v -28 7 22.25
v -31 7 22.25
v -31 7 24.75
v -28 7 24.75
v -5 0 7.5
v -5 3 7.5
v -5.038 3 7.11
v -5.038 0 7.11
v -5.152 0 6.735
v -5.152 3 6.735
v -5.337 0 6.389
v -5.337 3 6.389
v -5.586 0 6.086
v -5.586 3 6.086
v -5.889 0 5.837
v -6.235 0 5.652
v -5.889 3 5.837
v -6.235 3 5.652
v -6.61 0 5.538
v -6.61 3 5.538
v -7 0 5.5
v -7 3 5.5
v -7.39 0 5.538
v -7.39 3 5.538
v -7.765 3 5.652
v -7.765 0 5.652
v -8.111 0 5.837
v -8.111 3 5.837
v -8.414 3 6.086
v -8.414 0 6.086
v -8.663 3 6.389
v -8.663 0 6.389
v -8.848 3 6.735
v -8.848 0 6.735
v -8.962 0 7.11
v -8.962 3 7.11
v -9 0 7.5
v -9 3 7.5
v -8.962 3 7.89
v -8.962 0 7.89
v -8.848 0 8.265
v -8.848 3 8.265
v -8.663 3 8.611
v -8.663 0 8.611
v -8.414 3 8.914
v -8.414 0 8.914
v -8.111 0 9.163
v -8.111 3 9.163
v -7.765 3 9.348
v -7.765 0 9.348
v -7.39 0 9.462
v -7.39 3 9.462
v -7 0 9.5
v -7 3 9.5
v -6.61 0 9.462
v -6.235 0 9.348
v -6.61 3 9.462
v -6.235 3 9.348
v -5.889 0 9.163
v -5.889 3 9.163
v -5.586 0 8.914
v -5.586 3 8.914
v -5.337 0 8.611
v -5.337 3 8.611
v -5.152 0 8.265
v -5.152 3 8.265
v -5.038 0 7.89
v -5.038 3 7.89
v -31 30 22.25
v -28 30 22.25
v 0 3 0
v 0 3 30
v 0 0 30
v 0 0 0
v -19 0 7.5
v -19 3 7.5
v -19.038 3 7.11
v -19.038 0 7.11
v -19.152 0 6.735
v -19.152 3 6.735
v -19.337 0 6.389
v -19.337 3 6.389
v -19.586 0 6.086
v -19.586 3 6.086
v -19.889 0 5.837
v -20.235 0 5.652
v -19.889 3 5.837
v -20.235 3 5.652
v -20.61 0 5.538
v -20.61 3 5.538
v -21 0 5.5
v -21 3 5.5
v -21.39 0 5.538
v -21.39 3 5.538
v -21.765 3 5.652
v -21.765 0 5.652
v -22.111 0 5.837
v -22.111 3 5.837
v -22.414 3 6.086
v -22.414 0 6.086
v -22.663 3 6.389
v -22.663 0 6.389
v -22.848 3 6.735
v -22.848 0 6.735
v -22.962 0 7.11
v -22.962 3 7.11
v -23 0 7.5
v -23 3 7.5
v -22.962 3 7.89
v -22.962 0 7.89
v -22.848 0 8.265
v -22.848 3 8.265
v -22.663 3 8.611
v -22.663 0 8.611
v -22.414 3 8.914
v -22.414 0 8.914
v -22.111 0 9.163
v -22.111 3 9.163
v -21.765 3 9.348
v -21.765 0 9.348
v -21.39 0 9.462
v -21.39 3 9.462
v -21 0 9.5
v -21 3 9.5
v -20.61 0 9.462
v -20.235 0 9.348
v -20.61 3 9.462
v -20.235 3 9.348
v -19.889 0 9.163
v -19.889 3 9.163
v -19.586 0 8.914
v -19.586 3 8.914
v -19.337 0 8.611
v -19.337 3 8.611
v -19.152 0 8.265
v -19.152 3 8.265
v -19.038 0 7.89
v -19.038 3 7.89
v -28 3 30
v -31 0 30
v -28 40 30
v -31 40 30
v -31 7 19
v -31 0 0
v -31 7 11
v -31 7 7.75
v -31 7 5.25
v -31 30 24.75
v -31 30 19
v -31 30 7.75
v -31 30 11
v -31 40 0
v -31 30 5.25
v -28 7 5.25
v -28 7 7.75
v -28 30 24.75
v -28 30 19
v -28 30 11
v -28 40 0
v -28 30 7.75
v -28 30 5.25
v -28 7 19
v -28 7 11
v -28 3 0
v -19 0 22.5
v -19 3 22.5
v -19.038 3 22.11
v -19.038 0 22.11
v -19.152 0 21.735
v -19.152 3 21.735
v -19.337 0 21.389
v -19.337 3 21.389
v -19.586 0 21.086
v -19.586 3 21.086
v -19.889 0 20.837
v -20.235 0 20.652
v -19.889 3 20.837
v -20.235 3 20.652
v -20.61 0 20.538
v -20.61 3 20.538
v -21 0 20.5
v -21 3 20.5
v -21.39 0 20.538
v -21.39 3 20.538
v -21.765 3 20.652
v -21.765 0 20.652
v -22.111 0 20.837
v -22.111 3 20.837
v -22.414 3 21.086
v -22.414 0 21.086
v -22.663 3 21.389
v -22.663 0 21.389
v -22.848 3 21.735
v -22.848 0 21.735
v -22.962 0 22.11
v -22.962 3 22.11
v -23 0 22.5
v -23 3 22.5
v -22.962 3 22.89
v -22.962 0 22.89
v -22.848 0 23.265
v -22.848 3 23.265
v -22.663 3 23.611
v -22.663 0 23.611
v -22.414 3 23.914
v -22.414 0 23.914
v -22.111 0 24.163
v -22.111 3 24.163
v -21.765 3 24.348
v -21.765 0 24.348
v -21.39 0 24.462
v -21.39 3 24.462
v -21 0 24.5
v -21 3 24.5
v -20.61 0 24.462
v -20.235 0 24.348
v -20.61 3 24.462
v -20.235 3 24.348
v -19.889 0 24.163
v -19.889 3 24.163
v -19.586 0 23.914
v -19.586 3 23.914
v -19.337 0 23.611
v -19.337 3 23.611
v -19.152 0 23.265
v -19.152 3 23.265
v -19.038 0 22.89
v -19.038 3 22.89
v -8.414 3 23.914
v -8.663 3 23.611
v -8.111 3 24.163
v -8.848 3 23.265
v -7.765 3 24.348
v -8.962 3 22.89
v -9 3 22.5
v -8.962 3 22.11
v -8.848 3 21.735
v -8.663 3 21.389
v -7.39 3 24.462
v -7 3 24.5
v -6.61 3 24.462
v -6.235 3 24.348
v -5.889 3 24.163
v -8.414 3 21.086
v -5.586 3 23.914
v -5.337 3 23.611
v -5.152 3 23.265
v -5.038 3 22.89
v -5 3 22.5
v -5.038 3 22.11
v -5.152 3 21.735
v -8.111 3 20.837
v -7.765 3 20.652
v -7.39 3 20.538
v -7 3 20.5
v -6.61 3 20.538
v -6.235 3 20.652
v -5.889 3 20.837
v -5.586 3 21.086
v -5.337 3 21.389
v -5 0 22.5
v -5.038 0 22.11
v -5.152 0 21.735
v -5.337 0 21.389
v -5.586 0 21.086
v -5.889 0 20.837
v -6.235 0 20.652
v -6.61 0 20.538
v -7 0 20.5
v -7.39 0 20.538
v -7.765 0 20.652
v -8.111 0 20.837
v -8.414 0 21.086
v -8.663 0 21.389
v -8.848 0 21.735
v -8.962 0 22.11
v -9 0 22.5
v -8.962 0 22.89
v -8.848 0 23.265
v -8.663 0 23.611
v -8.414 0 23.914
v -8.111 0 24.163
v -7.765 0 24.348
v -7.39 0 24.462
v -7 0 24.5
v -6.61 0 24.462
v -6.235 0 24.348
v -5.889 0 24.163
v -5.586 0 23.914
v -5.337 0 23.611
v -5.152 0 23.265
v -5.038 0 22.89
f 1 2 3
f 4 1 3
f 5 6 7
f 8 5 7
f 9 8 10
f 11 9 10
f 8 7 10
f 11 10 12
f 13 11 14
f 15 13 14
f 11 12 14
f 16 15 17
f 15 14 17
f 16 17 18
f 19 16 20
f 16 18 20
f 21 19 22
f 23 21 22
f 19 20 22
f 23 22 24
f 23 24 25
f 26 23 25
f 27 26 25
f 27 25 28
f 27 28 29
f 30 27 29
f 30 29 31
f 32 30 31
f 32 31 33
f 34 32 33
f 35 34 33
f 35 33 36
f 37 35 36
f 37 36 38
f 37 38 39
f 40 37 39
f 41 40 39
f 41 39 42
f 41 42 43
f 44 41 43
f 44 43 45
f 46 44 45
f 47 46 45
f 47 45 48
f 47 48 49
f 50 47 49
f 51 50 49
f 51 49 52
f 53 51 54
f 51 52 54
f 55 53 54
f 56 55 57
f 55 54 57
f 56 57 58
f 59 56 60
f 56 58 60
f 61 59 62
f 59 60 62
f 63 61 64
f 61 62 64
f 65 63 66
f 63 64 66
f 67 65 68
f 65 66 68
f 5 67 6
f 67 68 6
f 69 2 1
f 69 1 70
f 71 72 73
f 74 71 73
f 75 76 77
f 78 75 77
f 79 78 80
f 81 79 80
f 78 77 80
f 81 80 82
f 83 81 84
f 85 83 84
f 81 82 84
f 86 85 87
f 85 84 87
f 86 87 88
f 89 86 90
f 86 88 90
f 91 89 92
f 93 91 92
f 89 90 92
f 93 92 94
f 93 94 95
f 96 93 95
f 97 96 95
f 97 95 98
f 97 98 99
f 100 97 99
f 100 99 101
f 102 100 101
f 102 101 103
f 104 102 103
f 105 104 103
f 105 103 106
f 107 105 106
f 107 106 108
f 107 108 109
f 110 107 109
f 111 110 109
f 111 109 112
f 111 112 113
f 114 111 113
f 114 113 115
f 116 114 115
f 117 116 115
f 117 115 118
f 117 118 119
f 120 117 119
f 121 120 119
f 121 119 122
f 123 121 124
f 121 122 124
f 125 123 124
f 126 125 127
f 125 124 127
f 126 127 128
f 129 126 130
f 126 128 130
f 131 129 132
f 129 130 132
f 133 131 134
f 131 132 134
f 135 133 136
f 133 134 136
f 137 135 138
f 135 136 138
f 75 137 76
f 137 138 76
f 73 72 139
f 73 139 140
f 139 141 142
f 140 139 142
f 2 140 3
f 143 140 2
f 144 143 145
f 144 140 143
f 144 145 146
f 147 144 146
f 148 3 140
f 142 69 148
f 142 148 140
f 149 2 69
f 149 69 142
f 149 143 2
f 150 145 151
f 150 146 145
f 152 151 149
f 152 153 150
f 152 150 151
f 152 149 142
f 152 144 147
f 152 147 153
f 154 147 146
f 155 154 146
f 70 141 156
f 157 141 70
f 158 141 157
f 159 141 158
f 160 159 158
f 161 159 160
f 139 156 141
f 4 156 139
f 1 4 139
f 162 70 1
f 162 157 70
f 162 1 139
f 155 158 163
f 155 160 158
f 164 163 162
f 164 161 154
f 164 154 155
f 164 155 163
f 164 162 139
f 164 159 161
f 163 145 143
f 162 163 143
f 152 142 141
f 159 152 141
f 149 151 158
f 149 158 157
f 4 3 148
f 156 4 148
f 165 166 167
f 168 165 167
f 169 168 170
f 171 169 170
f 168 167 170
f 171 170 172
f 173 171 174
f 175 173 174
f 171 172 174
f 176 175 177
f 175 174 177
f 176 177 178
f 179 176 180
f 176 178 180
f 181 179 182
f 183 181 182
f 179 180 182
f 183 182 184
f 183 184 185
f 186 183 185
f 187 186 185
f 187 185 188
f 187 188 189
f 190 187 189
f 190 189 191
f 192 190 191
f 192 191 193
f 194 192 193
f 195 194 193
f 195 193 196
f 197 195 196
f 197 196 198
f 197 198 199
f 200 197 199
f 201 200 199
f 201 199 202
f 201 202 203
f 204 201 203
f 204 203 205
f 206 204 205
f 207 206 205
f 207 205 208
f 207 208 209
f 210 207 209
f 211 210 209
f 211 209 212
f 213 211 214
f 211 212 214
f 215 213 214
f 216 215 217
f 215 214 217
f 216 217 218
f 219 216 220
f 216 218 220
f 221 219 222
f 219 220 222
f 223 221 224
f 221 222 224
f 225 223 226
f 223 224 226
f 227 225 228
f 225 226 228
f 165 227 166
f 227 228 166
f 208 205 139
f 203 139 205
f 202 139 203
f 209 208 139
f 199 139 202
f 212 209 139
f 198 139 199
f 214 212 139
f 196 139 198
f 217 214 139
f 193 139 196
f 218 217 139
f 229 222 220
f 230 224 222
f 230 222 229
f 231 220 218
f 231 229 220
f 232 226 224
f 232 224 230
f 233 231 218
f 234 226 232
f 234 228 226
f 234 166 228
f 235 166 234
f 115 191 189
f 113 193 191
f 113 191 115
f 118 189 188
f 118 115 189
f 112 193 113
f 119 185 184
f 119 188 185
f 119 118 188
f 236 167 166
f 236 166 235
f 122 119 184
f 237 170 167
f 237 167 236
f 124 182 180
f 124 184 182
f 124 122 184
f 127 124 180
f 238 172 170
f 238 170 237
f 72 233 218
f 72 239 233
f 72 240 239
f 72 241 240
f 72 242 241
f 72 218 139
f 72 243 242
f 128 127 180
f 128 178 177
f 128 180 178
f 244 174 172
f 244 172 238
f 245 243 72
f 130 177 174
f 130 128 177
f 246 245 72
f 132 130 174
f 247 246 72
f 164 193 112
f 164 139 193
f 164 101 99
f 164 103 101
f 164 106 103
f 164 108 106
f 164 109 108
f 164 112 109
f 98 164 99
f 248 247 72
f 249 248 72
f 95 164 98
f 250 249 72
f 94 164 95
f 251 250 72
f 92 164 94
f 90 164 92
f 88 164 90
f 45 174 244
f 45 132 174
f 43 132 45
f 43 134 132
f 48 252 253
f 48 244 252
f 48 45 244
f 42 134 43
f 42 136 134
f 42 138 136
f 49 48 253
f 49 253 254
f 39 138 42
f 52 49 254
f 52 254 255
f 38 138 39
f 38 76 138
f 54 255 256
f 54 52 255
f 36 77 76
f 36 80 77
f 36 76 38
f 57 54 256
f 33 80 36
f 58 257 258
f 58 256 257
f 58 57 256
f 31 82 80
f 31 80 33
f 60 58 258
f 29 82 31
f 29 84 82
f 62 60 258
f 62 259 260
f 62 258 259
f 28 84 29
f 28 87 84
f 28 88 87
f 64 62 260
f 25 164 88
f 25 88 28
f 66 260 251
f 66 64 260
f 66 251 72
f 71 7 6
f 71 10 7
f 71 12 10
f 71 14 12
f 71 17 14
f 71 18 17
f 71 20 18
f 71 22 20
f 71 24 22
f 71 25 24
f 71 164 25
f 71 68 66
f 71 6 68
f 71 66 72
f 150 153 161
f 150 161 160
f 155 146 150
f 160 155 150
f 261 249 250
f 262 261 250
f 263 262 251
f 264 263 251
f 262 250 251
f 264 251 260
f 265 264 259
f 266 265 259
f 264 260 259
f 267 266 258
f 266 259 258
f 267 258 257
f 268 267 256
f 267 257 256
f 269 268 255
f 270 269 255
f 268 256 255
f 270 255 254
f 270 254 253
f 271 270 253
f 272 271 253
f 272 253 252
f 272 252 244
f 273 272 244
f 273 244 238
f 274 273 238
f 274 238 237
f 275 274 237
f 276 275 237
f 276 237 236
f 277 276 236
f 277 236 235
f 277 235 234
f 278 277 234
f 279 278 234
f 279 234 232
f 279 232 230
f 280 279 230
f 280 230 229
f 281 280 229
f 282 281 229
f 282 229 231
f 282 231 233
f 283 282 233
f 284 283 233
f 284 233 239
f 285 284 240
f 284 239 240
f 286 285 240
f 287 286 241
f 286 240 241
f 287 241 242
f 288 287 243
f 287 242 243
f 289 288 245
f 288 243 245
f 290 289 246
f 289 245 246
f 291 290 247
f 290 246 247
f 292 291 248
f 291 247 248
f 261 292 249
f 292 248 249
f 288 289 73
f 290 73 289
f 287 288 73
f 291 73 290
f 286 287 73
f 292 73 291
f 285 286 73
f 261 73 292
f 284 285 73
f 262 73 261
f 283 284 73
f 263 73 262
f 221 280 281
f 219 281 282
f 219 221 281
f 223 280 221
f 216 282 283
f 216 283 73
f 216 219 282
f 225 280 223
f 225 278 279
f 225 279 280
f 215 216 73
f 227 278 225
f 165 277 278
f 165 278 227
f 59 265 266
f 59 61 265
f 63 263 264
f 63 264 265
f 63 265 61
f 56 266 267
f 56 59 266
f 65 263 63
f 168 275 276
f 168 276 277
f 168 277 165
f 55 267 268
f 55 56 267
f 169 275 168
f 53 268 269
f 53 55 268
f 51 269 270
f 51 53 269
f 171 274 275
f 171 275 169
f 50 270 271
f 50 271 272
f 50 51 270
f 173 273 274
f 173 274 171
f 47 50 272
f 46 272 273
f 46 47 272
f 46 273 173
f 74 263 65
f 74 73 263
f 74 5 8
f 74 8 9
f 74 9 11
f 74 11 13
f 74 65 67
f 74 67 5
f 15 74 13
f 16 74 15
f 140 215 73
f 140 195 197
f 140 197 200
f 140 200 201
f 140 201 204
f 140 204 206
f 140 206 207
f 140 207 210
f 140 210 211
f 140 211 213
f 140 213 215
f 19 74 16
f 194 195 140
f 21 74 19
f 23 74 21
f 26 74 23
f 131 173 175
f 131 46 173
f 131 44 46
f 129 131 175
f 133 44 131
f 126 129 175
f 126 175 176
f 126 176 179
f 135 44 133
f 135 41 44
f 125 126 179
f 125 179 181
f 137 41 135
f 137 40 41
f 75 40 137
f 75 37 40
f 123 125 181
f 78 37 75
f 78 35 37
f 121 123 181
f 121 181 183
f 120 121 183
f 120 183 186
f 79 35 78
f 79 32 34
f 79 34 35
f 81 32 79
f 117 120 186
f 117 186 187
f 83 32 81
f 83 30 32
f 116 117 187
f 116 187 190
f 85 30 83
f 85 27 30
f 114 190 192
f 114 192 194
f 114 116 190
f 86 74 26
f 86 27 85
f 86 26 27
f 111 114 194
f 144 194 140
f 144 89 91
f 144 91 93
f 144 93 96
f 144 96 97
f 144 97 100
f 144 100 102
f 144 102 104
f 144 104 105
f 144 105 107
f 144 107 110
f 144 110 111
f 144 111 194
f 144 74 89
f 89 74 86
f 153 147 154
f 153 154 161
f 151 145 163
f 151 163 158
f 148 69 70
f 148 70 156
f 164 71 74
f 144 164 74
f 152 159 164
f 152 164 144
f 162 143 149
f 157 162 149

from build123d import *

# Parameters (mm, degrees)
BOSS_EXTRUDE1_DEPTH = 30
SKETCH3_R           = 2
CUT_EXTRUDE1_DEPTH  = 4
SKETCH5_W           = 2.5
SKETCH5_H           = 23
SKETCH5_W_2         = 8
CUT_EXTRUDE2_DEPTH  = 32


with BuildPart() as part:
    # Sketch2 → Boss-Extrude1 (new body)
    with BuildSketch(Plane.XY):
        Polygon((0, 0), (-31, 0), (-31, 40), (-28, 40), (-28, 3), (0, 3), align=None)
    extrude(amount=BOSS_EXTRUDE1_DEPTH)

    # Sketch3 → Cut-Extrude1 (cut, through all)
    with BuildSketch(Plane(origin=(0, 3, 0), x_dir=(1, 0, 0), z_dir=(0, 1, 0))):
        with Locations((-7, -22.5)):
            Circle(SKETCH3_R)
        with Locations((-21, -22.5)):
            Circle(SKETCH3_R)
        with Locations((-7, -7.5)):
            Circle(SKETCH3_R)
        with Locations((-21, -7.5)):
            Circle(SKETCH3_R)
    extrude(amount=-CUT_EXTRUDE1_DEPTH, mode=Mode.SUBTRACT)

    # Sketch5 → Cut-Extrude2 (cut, through all)
    with BuildSketch(Plane.ZY.offset(31)):
        with Locations((23.5, 18.5)):
            Rectangle(SKETCH5_W, SKETCH5_H)
        with Locations((15, 18.5)):
            Rectangle(SKETCH5_W_2, SKETCH5_H)
        with Locations((6.5, 18.5)):
            Rectangle(SKETCH5_W, SKETCH5_H)
    extrude(amount=-CUT_EXTRUDE2_DEPTH, mode=Mode.SUBTRACT)


solid = part.part
